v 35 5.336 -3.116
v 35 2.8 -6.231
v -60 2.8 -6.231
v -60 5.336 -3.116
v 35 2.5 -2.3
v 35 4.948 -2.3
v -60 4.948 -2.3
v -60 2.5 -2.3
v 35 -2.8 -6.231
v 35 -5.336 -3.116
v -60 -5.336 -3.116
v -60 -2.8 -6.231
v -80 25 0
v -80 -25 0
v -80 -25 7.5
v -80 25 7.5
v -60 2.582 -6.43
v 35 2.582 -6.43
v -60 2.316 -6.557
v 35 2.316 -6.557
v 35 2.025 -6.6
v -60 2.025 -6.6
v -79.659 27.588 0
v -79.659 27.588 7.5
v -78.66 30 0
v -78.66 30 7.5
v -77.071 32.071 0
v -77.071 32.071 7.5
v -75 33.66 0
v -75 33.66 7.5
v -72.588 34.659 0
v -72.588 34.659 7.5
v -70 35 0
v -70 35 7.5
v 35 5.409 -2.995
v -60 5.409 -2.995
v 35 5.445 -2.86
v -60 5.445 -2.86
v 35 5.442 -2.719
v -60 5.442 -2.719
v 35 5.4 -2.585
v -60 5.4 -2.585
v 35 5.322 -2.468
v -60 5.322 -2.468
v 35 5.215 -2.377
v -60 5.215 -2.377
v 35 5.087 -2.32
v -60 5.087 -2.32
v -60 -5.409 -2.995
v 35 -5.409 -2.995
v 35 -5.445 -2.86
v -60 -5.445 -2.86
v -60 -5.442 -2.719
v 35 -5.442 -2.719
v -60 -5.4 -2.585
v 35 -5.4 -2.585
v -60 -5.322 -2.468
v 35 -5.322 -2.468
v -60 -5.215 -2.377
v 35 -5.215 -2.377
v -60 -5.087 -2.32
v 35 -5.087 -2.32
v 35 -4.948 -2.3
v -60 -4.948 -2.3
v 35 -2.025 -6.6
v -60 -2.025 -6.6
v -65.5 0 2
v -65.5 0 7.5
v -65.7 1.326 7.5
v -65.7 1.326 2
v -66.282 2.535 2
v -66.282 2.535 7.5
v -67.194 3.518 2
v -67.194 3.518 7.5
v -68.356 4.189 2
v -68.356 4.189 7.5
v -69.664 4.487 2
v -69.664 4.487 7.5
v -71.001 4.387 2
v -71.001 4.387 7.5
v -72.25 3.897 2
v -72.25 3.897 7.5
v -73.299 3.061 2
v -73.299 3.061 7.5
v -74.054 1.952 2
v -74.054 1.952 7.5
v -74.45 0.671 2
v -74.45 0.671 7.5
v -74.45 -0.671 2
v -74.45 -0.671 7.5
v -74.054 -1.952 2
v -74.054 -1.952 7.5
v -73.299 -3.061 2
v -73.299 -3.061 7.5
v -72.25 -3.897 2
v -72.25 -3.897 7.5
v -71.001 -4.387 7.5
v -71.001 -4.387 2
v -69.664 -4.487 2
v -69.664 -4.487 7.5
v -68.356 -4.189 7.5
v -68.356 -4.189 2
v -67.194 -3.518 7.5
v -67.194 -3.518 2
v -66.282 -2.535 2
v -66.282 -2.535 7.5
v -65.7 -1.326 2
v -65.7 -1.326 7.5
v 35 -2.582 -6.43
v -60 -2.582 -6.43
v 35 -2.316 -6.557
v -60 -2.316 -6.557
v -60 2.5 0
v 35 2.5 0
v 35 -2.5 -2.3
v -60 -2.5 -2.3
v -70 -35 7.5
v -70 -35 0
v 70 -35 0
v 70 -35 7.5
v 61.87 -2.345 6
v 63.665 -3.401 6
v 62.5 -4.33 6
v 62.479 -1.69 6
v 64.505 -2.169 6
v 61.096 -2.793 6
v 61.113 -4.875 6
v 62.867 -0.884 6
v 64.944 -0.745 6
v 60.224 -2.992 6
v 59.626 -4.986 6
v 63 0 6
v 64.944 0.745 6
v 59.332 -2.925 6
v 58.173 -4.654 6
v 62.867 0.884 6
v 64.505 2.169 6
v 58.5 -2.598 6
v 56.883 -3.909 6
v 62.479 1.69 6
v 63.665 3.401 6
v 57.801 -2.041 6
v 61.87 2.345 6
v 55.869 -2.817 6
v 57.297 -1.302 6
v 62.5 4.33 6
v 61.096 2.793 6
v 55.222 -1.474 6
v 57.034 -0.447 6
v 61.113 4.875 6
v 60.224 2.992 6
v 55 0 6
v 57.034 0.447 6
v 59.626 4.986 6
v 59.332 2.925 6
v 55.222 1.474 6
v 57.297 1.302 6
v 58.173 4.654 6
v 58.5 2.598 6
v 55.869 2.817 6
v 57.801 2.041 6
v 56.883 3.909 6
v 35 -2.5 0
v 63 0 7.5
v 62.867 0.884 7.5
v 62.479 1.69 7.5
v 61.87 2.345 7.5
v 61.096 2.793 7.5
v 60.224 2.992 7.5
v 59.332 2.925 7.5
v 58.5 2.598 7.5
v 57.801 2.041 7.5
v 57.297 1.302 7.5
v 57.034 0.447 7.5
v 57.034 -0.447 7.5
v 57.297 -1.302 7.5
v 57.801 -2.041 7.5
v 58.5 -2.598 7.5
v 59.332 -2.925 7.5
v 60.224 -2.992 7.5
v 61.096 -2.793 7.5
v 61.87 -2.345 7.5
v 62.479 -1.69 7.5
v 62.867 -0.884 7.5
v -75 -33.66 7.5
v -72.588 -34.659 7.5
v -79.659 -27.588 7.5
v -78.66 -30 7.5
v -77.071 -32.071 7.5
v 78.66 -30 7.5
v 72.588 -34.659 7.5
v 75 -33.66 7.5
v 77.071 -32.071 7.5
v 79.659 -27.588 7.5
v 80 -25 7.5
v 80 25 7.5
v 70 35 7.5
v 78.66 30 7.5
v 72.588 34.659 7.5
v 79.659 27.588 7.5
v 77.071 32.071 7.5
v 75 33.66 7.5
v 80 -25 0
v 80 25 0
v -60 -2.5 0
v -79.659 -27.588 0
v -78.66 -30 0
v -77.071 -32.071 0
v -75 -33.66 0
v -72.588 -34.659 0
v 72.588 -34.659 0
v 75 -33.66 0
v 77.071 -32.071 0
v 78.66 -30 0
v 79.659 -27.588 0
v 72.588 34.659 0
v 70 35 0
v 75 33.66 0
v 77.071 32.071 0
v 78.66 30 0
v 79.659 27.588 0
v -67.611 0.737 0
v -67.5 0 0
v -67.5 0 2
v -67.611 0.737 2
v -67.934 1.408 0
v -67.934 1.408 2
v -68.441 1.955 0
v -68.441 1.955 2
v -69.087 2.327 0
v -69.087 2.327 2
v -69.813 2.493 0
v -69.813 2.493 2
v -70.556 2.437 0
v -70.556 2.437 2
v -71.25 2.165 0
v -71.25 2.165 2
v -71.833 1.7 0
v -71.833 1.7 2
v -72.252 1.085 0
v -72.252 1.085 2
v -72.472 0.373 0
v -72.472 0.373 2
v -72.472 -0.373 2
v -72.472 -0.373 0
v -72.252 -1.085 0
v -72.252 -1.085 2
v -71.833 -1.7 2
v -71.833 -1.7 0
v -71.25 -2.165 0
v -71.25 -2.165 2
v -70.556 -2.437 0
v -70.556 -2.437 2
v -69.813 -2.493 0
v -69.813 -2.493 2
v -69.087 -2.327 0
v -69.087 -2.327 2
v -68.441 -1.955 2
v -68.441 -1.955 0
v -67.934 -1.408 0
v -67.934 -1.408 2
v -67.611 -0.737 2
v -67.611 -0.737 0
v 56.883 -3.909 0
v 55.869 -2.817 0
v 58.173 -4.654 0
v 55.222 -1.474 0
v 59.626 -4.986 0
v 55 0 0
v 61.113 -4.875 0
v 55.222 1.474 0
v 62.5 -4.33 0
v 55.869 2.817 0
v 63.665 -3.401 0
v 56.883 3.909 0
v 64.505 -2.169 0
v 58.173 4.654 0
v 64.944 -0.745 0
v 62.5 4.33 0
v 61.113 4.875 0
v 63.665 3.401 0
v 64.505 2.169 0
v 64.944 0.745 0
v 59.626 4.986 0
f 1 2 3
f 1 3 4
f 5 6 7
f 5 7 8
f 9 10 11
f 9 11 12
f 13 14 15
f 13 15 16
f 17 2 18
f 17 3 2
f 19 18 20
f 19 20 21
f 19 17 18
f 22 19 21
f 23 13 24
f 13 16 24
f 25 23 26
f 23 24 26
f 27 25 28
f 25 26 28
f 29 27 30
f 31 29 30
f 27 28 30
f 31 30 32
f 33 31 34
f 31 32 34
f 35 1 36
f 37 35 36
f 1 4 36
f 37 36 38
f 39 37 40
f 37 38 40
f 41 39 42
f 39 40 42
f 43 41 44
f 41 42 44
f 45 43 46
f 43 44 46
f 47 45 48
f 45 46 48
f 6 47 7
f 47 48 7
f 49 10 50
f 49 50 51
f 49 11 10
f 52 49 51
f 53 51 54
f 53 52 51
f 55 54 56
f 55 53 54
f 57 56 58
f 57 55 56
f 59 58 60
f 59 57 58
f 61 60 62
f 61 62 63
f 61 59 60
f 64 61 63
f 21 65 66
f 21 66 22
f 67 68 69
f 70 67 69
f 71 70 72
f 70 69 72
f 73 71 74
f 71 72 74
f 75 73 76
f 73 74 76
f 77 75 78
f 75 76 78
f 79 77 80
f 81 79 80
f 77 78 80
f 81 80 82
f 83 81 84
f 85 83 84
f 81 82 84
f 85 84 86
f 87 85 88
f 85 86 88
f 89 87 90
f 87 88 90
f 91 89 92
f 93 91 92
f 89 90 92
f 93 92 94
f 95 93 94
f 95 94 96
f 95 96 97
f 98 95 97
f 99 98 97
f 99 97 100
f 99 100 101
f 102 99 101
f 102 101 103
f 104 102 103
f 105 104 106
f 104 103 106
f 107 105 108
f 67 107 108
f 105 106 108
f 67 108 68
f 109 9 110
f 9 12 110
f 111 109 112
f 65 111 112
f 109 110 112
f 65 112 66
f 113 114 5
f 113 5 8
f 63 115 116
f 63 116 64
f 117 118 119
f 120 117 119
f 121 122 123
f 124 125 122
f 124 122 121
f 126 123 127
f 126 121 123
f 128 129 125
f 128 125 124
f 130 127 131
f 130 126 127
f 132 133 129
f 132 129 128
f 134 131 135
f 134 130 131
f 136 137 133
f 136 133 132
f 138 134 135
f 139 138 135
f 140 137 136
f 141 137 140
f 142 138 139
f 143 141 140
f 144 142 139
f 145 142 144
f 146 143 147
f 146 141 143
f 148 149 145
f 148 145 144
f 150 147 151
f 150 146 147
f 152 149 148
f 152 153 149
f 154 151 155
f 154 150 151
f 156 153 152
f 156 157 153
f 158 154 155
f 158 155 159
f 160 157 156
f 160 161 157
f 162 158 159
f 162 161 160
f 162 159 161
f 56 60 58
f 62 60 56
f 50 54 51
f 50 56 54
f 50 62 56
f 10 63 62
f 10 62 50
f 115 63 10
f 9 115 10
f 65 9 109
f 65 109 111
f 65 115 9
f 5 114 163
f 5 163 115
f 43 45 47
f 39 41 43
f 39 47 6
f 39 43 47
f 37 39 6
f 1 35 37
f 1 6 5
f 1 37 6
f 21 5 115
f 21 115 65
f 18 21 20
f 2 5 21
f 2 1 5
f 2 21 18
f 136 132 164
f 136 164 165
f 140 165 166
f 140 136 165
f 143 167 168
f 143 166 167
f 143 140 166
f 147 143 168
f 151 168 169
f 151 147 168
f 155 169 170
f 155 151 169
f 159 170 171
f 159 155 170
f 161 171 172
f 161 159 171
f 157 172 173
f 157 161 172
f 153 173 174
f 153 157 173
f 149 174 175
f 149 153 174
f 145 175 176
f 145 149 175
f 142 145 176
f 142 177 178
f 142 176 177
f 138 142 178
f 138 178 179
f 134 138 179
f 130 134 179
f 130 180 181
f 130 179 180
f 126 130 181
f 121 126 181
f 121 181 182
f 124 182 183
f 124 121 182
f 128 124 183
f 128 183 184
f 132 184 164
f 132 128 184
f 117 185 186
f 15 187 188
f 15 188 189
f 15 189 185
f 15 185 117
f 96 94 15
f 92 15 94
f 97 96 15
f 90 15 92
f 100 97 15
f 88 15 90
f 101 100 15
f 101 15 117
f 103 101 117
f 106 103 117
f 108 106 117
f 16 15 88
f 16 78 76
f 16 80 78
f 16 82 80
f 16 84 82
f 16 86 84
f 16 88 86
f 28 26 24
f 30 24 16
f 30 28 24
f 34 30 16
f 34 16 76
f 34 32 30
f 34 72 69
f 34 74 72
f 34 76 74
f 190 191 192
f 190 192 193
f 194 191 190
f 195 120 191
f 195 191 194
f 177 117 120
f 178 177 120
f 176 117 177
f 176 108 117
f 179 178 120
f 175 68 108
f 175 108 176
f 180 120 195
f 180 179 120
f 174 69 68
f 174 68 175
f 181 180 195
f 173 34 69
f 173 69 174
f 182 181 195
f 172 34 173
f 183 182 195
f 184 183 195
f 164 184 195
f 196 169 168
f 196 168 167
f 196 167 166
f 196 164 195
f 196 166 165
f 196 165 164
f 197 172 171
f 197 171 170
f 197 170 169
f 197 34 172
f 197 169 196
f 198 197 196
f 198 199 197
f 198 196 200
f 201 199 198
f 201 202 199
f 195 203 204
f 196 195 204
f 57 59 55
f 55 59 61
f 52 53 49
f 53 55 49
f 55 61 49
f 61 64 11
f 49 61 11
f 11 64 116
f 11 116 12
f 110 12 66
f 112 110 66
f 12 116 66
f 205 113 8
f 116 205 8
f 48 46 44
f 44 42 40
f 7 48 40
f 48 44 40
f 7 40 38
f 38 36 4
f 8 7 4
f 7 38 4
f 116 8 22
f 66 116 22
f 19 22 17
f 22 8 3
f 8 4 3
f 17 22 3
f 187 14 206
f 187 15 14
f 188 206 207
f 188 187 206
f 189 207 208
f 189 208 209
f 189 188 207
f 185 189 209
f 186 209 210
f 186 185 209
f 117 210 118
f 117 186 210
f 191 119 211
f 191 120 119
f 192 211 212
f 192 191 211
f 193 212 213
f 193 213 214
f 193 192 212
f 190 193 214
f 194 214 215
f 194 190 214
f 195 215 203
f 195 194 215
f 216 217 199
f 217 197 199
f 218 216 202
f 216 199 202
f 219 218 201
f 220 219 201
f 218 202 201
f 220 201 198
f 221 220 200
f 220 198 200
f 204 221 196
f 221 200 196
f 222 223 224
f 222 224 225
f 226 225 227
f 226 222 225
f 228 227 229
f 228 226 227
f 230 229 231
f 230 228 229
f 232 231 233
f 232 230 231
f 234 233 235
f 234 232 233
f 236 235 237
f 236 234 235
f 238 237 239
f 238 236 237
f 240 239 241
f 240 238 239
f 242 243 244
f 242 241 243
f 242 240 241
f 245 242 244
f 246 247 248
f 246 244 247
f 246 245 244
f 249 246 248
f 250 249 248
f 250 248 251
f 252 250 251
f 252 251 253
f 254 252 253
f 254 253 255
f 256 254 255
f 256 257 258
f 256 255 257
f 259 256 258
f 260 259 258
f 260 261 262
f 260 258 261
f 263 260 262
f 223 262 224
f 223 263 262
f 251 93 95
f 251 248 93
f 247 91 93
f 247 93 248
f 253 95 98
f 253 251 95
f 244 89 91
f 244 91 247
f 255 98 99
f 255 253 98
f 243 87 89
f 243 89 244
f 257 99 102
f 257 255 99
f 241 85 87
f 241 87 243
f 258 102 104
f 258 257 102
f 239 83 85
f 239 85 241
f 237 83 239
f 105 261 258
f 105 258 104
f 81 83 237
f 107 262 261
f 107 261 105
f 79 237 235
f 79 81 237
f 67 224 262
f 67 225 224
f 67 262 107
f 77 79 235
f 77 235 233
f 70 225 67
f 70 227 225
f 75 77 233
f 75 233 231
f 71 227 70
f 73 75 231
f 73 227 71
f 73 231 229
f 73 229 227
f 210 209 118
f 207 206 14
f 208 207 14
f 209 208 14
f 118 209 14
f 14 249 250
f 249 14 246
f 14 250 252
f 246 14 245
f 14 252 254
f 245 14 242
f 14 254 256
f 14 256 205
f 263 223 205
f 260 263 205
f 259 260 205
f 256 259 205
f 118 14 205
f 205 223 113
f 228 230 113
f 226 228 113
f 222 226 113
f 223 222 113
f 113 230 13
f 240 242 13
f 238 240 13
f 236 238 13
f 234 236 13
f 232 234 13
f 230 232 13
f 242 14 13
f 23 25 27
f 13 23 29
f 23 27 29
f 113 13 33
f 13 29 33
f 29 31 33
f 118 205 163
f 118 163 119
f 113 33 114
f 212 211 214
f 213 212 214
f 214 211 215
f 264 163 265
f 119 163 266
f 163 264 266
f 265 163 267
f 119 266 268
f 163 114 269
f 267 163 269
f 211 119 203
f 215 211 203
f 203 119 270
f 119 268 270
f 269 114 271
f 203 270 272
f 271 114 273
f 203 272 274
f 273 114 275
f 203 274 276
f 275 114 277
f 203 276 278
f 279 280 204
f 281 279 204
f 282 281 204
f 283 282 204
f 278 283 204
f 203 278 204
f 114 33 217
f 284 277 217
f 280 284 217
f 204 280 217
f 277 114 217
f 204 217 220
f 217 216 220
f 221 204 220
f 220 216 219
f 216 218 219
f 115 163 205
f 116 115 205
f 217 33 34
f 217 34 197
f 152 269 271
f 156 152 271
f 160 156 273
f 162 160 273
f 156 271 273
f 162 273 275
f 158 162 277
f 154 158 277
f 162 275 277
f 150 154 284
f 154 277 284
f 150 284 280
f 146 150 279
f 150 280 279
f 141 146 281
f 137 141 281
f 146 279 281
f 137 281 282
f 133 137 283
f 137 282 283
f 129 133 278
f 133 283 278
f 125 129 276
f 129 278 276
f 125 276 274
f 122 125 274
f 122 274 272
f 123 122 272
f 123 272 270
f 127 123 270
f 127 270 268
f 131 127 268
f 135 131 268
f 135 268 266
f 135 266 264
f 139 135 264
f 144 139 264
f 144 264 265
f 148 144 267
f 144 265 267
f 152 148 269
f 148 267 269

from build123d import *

# Parameters (mm, degrees)
SKETCH1_W               = 160
SKETCH1_H               = 70
BOSS_EXTRUDE1_DEPTH     = 7.5
CUT_EXTRUDE1_DEPTH      = 88.642740715
CUT_EXTRUDE1_DEPTH_BACK = 88.642740715
SKETCH2_R               = 2.5
SKETCH2_R_2             = 3
SKETCH3_R               = 4.5
CUT_EXTRUDE2_DEPTH      = 5.5
SKETCH4_R               = 5
CUT_EXTRUDE3_DEPTH      = 6
SKETCH5_W               = 95
SKETCH5_H               = 5
BOSS_EXTRUDE2_DEPTH     = 2.3
BOSS_EXTRUDE3_DEPTH     = 95
FILLET1_R               = 1
FILLET2_R               = 0.5
FILLET3_R               = 10


with BuildPart() as part:
    # Sketch1 → Boss-Extrude1 (new body)
    with BuildSketch(Plane.XY):
        Rectangle(SKETCH1_W, SKETCH1_H)
    extrude(amount=BOSS_EXTRUDE1_DEPTH)

    # Sketch2 → Cut-Extrude1 (cut, two sides: drawn at the far end of the back side and taken through both)
    with BuildSketch(Plane.XY.offset(7.5).offset(-CUT_EXTRUDE1_DEPTH_BACK)):
        with Locations((-70, 0)):
            Circle(SKETCH2_R)
        with Locations((60, 0)):
            Circle(SKETCH2_R_2)
    extrude(amount=CUT_EXTRUDE1_DEPTH + CUT_EXTRUDE1_DEPTH_BACK, mode=Mode.SUBTRACT)

    # Sketch3 → Cut-Extrude2 (cut)
    with BuildSketch(Plane.XY.offset(7.5)):
        with Locations((-70, 0)):
            Circle(SKETCH3_R)
    extrude(amount=-CUT_EXTRUDE2_DEPTH, mode=Mode.SUBTRACT)

    # Sketch4 → Cut-Extrude3 (cut)
    with BuildSketch(Plane(origin=(0, 0, 0), x_dir=(-1, 0, 0), z_dir=(0, 0, -1))):
        with Locations((-60, 0)):
            Circle(SKETCH4_R)
    extrude(amount=-CUT_EXTRUDE3_DEPTH, mode=Mode.SUBTRACT)

    # Sketch5 → Boss-Extrude2 (add)
    with BuildSketch(Plane(origin=(0, 0, 0), x_dir=(-1, 0, 0), z_dir=(0, 0, -1))):
        with Locations((12.5, 0)):
            Rectangle(SKETCH5_W, SKETCH5_H)
    extrude(amount=BOSS_EXTRUDE2_DEPTH)

    # Sketch6 → Boss-Extrude3 (add)
    with BuildSketch(Plane(origin=(35, 0, 0), x_dir=(0, 0, -1), z_dir=(1, 0, 0))):
        Polygon((2.3, 6), (2.3, -6), (6.6, -2.5), (6.6, 2.5), align=None)
    extrude(amount=-BOSS_EXTRUDE3_DEPTH)

    # Fillet1
    fillet1_edges = [part.edges().sort_by_distance(p)[0] for p in [
        (-12.5, -2.5, -6.6),
        (-12.5, 2.5, -6.6),
    ]]
    fillet(fillet1_edges, radius=FILLET1_R)

    # Fillet2
    fillet2_edges = [part.edges().sort_by_distance(p)[0] for p in [
        (-12.5, -6, -2.3),
        (-12.5, 6, -2.3),
    ]]
    fillet(fillet2_edges, radius=FILLET2_R)

    # Fillet3
    fillet3_edges = [part.edges().sort_by_distance(p)[0] for p in [
        (-80, 35, 3.75),
        (80, 35, 3.75),
        (80, -35, 3.75),
        (-80, -35, 3.75),
    ]]
    fillet(fillet3_edges, radius=FILLET3_R)


solid = part.part
